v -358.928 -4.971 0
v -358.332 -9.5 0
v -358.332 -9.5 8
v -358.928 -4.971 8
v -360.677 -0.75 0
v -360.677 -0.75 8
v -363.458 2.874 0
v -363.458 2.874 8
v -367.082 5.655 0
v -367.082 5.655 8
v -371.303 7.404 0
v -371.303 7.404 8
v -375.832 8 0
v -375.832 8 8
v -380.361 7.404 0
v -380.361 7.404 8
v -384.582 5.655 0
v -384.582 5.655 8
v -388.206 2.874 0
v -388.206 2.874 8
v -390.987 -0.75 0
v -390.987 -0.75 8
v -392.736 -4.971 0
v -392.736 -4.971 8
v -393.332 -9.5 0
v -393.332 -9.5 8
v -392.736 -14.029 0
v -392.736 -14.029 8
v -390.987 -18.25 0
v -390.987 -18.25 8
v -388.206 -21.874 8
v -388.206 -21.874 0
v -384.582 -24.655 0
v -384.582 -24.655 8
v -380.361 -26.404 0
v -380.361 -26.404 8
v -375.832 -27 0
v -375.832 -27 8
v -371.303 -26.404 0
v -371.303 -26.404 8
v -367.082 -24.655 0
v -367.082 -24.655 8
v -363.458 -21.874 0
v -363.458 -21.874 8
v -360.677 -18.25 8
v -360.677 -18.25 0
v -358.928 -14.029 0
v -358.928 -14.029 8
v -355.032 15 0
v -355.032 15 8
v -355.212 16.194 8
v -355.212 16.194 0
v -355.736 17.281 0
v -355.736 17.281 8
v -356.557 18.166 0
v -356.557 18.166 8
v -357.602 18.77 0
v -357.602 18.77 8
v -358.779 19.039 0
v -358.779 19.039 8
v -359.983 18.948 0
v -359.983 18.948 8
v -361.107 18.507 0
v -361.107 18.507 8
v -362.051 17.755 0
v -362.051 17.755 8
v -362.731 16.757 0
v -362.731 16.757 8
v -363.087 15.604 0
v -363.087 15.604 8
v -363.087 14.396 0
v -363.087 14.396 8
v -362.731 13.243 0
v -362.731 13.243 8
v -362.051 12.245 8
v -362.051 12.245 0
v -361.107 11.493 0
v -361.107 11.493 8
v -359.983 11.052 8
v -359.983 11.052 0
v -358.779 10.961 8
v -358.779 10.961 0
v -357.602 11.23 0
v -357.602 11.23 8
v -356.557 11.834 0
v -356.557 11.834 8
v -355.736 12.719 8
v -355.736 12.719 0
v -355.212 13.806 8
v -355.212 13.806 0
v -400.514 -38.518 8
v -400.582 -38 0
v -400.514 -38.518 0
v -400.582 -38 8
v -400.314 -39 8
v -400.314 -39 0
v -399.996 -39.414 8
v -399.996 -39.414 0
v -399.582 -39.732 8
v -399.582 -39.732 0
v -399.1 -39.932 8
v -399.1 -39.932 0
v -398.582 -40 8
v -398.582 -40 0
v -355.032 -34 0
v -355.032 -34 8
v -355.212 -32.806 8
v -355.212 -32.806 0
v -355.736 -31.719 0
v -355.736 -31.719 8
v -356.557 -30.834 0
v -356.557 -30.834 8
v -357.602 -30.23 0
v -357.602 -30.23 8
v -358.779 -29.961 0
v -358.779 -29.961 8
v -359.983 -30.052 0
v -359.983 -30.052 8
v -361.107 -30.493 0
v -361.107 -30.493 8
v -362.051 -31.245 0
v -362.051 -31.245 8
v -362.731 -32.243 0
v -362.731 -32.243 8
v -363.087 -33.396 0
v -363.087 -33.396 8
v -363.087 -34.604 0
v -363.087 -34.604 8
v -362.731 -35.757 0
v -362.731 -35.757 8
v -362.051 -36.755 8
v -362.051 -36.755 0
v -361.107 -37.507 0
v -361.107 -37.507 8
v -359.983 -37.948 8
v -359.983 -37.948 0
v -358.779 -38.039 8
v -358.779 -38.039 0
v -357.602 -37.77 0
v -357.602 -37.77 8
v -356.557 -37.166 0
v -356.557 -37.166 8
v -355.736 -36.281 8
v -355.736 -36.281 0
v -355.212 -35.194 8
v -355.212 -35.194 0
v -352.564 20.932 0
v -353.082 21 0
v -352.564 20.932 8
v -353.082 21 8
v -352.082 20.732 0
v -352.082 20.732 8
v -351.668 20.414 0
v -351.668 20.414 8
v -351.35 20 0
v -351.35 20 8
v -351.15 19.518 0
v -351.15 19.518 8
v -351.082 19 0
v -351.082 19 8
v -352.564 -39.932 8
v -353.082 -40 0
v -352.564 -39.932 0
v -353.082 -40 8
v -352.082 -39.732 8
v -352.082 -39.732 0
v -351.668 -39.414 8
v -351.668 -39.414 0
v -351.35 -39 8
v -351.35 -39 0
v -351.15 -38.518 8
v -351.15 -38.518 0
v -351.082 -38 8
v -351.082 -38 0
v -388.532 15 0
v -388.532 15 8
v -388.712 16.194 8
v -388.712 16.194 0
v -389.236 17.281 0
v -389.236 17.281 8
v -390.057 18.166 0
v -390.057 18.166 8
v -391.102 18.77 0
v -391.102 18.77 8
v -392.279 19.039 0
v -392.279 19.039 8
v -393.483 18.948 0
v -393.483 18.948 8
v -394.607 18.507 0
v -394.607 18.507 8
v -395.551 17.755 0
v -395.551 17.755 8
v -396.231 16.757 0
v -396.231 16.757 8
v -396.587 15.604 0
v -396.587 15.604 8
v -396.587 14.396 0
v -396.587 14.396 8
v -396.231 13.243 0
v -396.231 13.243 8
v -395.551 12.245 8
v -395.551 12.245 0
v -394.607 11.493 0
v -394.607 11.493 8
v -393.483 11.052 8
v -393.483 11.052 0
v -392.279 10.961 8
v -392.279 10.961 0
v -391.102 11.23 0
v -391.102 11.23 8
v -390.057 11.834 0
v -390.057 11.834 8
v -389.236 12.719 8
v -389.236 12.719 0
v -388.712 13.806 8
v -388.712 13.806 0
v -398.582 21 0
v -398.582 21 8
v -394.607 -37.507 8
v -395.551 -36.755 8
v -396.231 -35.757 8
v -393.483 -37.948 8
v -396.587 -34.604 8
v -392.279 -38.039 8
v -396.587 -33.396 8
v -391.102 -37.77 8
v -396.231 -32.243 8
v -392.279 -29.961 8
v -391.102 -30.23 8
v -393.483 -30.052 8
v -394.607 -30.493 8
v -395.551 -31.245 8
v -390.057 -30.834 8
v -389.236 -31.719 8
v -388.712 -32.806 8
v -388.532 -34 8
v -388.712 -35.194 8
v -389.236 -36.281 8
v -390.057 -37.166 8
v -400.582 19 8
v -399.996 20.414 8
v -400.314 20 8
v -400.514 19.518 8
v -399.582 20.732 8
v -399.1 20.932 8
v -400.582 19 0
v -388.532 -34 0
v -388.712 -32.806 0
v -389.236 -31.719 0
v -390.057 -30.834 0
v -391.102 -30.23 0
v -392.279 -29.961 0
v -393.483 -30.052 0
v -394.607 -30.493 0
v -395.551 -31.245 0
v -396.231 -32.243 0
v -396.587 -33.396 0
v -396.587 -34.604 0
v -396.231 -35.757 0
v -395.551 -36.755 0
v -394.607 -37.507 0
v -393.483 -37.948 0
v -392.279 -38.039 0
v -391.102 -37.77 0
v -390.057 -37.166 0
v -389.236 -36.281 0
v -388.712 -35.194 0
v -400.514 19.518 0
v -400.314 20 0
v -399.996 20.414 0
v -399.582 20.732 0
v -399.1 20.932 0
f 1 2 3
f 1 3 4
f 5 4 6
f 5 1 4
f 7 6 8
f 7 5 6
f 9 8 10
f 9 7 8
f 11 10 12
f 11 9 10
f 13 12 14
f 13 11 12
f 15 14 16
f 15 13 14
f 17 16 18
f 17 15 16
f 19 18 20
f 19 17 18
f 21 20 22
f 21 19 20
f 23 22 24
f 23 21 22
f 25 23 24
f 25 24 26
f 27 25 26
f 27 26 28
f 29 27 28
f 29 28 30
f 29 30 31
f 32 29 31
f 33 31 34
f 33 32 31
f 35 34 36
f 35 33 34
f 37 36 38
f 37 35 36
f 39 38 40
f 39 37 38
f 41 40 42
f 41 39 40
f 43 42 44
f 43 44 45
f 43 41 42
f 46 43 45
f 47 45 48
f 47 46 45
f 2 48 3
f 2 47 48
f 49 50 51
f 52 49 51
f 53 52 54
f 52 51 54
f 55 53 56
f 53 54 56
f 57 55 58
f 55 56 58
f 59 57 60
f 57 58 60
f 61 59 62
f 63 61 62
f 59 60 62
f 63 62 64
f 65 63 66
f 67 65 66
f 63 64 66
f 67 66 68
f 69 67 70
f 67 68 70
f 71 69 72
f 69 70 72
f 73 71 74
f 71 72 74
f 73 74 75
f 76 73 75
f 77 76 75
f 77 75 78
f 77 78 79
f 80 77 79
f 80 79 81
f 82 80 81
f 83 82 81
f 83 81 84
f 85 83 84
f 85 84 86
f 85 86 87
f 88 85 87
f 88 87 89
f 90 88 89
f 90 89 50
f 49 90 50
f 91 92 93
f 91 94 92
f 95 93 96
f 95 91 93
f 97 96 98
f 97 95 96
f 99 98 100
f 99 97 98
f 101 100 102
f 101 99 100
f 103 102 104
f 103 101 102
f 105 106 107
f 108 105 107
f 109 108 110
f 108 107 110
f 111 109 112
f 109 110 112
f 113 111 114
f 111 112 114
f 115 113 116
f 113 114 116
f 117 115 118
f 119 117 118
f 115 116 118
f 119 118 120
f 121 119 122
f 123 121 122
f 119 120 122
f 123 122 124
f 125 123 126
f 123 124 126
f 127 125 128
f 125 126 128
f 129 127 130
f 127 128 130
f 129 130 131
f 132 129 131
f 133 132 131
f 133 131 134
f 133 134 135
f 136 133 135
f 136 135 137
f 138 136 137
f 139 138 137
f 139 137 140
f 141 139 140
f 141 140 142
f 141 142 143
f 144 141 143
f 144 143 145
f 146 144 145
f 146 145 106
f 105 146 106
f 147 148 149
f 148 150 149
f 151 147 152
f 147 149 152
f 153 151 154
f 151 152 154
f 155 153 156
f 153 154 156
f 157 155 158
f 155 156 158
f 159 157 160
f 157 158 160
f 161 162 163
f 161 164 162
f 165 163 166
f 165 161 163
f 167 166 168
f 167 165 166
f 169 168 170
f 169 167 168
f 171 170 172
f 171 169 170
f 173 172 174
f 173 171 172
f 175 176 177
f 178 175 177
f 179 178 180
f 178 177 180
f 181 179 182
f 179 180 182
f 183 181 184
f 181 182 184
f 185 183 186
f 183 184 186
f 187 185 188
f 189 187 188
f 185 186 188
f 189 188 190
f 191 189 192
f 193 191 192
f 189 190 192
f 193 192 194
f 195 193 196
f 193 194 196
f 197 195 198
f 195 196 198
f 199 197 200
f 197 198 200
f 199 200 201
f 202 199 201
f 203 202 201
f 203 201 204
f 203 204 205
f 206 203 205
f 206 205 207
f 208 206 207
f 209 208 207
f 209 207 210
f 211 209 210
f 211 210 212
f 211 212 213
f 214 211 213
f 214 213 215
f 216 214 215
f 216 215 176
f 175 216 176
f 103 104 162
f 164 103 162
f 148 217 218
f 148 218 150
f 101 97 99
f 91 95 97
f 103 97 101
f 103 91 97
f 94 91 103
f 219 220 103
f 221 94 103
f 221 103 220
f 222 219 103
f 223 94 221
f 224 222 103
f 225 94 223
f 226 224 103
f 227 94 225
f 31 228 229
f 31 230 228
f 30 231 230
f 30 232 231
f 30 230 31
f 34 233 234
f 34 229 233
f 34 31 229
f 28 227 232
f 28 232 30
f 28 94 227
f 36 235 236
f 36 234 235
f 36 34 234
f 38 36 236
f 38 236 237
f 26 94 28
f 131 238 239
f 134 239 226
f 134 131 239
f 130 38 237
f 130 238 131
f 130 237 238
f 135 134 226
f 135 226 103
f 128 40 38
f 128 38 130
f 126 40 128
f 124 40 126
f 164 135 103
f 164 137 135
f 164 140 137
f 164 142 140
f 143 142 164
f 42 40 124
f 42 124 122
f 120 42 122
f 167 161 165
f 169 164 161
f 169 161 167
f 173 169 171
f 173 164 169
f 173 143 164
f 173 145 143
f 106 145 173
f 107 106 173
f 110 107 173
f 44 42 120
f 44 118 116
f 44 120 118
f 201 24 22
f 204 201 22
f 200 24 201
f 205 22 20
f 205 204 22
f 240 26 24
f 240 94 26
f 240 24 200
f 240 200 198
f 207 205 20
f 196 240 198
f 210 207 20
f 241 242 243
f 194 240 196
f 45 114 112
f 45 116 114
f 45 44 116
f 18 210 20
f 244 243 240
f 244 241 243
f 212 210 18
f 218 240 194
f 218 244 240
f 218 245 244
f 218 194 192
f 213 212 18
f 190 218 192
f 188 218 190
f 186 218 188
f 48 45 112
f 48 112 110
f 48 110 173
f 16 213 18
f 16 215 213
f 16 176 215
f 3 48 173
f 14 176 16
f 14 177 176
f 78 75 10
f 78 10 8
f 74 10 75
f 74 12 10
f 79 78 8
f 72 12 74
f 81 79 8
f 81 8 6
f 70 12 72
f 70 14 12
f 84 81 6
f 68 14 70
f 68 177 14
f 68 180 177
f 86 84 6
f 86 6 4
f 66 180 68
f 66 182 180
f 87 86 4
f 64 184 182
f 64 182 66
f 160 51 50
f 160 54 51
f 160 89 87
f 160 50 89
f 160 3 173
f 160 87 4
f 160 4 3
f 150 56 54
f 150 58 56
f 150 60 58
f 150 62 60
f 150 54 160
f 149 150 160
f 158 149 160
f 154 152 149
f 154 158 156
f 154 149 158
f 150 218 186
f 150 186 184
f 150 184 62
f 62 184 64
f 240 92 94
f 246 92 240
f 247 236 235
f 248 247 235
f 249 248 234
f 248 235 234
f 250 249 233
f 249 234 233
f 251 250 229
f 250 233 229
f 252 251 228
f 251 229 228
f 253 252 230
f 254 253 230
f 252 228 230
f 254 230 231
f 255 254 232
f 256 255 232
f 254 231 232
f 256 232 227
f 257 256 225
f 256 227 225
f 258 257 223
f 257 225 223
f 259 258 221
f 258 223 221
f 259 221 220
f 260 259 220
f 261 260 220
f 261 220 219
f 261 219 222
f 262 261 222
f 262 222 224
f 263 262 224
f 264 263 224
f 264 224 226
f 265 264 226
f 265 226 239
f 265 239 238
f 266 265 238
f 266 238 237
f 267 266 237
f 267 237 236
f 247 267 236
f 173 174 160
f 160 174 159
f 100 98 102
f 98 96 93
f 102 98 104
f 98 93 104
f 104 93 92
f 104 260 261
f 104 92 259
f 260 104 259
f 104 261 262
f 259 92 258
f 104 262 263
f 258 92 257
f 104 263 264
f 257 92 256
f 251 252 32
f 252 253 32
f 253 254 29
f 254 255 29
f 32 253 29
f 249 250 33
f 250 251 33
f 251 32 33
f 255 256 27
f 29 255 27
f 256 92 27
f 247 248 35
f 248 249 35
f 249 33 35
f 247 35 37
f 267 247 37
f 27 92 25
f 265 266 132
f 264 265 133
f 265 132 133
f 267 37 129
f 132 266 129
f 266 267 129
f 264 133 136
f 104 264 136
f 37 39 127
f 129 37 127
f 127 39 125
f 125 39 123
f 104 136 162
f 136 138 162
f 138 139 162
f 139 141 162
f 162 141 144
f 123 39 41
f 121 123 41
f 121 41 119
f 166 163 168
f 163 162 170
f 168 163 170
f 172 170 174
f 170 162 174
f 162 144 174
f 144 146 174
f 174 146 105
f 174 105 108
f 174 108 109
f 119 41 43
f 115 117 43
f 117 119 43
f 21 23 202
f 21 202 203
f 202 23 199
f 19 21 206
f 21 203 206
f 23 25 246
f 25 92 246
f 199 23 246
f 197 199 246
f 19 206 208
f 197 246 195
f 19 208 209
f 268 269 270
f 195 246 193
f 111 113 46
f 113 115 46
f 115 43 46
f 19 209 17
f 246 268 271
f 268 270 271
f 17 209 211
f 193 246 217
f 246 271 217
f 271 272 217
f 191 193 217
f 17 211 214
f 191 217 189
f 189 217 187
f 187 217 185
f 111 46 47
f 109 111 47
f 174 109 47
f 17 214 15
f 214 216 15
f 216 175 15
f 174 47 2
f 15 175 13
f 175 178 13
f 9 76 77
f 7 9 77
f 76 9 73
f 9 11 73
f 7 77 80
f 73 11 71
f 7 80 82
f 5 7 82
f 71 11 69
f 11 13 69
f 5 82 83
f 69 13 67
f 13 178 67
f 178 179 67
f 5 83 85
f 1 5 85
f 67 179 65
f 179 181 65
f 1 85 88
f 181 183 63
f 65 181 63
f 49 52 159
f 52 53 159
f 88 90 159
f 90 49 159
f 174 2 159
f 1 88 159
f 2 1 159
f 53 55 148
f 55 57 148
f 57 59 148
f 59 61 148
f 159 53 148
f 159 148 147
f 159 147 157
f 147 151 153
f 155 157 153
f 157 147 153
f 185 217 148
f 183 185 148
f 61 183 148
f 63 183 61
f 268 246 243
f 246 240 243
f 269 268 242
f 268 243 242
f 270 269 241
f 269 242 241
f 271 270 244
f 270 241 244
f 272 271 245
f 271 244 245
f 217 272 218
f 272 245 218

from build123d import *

# Parameters (mm, degrees)
SKETCH1_W           = 49.5
SKETCH1_H           = 61
SKETCH1_R           = 17.5
BOSS_EXTRUDE1_DEPTH = 8
FILLET1_R           = 2
SKETCH25_R          = 4.05
CUT_EXTRUDE24_DEPTH = 20


with BuildPart() as part:
    # Sketch1 → Boss-Extrude1 (new body)
    with BuildSketch(Plane.XY):
        with Locations((-375.83204095, -9.5)):
            Rectangle(SKETCH1_W, SKETCH1_H)
        with Locations((-375.83204095, -9.5)):
            Circle(SKETCH1_R, mode=Mode.SUBTRACT)
    extrude(amount=BOSS_EXTRUDE1_DEPTH)

    # Fillet1
    fillet1_edges = [part.edges().sort_by_distance(p)[0] for p in [
        (-400.58204095, -40, 4),
        (-400.58204095, 21, 4),
        (-351.08204095, 21, 4),
        (-351.08204095, -40, 4),
    ]]
    fillet(fillet1_edges, radius=FILLET1_R)

    # Sketch25 → Cut-Extrude24 (cut)
    with BuildSketch(Plane(origin=(-362.113949842, -45.191927803, 10), x_dir=(1, 0, 0), z_dir=(0, 0, 1))):
        with Locations((-30.468091108, 11.191927803)):
            Circle(SKETCH25_R)
        with Locations((-30.468091108, 60.191927803)):
            Circle(SKETCH25_R)
        with Locations((3.031908892, 11.191927803)):
            Circle(SKETCH25_R)
        with Locations((3.031908892, 60.191927803)):
            Circle(SKETCH25_R)
    extrude(amount=-CUT_EXTRUDE24_DEPTH, mode=Mode.SUBTRACT)


solid = part.part
